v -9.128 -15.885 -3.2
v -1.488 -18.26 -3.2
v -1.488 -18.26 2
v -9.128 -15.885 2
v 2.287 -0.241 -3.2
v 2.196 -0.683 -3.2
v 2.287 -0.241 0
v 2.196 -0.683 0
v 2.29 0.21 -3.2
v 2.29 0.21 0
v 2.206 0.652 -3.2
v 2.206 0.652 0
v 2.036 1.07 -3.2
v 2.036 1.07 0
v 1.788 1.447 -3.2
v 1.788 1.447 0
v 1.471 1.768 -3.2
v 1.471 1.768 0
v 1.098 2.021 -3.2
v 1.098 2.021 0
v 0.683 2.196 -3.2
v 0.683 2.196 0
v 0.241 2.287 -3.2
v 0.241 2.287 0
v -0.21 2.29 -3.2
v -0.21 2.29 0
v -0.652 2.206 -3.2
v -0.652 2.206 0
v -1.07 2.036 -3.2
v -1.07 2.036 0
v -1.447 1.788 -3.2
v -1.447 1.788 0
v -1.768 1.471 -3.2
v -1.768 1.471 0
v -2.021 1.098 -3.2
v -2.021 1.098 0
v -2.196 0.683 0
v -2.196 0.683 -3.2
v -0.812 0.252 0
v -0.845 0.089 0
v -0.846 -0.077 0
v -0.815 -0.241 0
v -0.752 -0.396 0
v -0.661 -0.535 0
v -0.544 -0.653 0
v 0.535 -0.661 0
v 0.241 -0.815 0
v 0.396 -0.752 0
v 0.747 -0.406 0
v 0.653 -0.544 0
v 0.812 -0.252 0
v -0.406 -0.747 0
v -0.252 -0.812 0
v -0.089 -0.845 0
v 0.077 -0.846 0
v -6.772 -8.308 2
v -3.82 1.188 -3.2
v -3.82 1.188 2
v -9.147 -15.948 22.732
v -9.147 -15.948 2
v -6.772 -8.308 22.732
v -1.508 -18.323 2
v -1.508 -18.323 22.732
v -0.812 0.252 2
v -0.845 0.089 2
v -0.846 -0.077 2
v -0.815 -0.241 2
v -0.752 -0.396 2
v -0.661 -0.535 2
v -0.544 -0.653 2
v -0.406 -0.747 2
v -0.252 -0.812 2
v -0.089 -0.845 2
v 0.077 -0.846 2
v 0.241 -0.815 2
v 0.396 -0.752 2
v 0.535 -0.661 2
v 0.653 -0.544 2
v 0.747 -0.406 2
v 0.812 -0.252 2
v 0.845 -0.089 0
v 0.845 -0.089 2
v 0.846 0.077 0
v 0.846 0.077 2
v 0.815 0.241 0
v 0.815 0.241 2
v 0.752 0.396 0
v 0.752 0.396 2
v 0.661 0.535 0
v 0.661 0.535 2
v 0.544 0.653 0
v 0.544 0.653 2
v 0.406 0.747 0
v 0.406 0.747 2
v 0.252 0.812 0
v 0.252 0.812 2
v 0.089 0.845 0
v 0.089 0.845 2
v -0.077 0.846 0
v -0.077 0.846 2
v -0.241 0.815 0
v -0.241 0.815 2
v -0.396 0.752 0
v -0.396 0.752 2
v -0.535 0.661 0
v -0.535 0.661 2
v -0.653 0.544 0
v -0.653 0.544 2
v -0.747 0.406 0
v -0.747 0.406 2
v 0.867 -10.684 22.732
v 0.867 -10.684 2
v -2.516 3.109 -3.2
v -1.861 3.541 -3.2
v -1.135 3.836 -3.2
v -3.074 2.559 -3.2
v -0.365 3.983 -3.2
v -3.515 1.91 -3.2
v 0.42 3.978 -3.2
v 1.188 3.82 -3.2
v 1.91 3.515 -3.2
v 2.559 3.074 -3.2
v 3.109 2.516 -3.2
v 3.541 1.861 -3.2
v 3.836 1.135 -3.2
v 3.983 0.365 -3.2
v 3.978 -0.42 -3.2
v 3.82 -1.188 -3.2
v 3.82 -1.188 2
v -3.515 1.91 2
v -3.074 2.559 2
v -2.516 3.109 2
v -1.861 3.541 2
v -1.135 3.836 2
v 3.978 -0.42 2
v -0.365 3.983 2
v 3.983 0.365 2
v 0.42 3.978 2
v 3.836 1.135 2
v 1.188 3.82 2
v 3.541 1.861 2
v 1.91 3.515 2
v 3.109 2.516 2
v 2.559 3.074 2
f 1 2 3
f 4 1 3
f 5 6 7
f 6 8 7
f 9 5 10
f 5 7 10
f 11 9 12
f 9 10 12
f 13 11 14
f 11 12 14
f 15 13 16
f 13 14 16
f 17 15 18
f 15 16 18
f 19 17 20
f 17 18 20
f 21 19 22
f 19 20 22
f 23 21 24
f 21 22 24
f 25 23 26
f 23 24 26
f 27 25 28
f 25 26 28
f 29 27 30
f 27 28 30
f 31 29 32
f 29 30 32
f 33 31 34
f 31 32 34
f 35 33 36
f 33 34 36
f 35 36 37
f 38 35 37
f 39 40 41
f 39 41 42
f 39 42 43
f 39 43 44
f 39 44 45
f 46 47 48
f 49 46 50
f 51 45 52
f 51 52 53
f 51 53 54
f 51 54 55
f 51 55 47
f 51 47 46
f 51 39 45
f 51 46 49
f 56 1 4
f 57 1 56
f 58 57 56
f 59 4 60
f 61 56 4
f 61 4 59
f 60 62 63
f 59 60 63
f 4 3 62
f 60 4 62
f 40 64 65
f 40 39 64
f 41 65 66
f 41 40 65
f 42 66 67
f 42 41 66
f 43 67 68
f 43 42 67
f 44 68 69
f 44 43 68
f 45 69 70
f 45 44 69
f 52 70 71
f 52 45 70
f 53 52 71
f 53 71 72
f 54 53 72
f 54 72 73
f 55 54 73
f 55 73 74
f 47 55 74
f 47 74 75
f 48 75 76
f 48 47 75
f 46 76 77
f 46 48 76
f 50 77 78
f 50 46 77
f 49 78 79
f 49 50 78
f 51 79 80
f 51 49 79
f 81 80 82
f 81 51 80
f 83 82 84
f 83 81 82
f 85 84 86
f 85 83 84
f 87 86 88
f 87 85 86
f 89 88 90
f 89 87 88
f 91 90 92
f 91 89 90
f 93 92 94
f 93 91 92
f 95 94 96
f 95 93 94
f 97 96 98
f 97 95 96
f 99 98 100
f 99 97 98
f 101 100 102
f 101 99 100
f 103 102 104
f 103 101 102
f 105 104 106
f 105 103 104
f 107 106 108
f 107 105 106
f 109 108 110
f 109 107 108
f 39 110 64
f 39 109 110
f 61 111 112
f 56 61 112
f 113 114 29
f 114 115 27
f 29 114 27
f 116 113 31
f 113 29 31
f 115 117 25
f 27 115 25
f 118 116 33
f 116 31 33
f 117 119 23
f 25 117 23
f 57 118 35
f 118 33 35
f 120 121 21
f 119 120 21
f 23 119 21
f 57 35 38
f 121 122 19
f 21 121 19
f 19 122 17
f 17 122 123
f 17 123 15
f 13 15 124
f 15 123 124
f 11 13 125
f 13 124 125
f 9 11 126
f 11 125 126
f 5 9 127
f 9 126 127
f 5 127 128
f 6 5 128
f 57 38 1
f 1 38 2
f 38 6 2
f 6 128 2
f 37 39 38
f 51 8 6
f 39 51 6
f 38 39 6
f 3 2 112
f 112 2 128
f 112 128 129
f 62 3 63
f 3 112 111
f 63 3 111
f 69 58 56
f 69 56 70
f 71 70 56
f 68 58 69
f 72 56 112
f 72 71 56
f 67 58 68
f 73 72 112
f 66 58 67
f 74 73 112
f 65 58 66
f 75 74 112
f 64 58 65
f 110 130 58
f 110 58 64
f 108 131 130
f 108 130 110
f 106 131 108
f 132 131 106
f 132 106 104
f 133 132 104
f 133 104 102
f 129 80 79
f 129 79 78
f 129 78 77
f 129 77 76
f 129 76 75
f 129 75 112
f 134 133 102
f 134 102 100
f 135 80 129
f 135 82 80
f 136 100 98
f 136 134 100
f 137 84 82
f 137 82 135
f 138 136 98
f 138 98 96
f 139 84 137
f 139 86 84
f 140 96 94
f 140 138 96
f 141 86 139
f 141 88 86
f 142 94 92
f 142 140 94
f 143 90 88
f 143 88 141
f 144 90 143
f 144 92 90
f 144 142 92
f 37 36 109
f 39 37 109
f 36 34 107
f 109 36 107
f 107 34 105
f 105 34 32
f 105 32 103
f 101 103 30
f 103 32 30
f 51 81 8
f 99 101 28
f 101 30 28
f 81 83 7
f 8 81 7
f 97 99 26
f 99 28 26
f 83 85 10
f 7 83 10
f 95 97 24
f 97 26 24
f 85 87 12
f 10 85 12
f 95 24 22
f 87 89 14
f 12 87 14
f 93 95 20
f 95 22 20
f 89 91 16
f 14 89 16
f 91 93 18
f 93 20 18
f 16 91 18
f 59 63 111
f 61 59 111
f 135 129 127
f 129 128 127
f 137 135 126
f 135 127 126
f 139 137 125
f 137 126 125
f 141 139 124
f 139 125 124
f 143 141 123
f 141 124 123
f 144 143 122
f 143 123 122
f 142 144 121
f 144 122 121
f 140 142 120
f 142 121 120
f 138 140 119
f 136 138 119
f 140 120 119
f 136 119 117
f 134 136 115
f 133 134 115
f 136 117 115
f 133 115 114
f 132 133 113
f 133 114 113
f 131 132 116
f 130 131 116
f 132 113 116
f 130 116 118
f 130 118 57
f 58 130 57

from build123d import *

# Parameters (mm, degrees)
SKETCH1_R           = 4
SKETCH1_R_2         = 2.3
BOSS_EXTRUDE1_DEPTH = 3.2
SKETCH2_R           = 4
SKETCH2_R_2         = 0.85
BOSS_EXTRUDE2_DEPTH = 2
BOSS_EXTRUDE3_DEPTH = 8
SKETCH6_R           = 0.85
CUT_EXTRUDE1_DEPTH  = 2


with BuildPart() as part:
    # Sketch1 → Boss-Extrude1 (new body)
    with BuildSketch(Plane.XY):
        Circle(SKETCH1_R)
        Circle(SKETCH1_R_2, mode=Mode.SUBTRACT)
    extrude(amount=-BOSS_EXTRUDE1_DEPTH)

    # Sketch2 → Boss-Extrude2 (add)
    with BuildSketch(Plane.XY):
        Circle(SKETCH2_R)
        Circle(SKETCH2_R_2, mode=Mode.SUBTRACT)
    extrude(amount=BOSS_EXTRUDE2_DEPTH)

    # Sketch5 → Boss-Extrude3 (add)
    with BuildSketch(Plane(origin=(3.819651946, -1.187543266, 0), x_dir=(0, 0, -1), z_dir=(0.954912987, -0.296885816, 0))):
        Polygon((-2, 0), (3.2, 0), (3.2, -17.878888538), (-2, -17.878888538), (-2, -17.94433562), (-22.731913212, -17.94433562), (-22.731913212, -9.94433562), (-2, -9.94433562), align=None)
    extrude(amount=-BOSS_EXTRUDE3_DEPTH)

    # Sketch6 → Cut-Extrude1 (cut)
    with BuildSketch(Plane.XY.offset(2)):
        Circle(SKETCH6_R)
    extrude(amount=-CUT_EXTRUDE1_DEPTH, mode=Mode.SUBTRACT)


solid = part.part
